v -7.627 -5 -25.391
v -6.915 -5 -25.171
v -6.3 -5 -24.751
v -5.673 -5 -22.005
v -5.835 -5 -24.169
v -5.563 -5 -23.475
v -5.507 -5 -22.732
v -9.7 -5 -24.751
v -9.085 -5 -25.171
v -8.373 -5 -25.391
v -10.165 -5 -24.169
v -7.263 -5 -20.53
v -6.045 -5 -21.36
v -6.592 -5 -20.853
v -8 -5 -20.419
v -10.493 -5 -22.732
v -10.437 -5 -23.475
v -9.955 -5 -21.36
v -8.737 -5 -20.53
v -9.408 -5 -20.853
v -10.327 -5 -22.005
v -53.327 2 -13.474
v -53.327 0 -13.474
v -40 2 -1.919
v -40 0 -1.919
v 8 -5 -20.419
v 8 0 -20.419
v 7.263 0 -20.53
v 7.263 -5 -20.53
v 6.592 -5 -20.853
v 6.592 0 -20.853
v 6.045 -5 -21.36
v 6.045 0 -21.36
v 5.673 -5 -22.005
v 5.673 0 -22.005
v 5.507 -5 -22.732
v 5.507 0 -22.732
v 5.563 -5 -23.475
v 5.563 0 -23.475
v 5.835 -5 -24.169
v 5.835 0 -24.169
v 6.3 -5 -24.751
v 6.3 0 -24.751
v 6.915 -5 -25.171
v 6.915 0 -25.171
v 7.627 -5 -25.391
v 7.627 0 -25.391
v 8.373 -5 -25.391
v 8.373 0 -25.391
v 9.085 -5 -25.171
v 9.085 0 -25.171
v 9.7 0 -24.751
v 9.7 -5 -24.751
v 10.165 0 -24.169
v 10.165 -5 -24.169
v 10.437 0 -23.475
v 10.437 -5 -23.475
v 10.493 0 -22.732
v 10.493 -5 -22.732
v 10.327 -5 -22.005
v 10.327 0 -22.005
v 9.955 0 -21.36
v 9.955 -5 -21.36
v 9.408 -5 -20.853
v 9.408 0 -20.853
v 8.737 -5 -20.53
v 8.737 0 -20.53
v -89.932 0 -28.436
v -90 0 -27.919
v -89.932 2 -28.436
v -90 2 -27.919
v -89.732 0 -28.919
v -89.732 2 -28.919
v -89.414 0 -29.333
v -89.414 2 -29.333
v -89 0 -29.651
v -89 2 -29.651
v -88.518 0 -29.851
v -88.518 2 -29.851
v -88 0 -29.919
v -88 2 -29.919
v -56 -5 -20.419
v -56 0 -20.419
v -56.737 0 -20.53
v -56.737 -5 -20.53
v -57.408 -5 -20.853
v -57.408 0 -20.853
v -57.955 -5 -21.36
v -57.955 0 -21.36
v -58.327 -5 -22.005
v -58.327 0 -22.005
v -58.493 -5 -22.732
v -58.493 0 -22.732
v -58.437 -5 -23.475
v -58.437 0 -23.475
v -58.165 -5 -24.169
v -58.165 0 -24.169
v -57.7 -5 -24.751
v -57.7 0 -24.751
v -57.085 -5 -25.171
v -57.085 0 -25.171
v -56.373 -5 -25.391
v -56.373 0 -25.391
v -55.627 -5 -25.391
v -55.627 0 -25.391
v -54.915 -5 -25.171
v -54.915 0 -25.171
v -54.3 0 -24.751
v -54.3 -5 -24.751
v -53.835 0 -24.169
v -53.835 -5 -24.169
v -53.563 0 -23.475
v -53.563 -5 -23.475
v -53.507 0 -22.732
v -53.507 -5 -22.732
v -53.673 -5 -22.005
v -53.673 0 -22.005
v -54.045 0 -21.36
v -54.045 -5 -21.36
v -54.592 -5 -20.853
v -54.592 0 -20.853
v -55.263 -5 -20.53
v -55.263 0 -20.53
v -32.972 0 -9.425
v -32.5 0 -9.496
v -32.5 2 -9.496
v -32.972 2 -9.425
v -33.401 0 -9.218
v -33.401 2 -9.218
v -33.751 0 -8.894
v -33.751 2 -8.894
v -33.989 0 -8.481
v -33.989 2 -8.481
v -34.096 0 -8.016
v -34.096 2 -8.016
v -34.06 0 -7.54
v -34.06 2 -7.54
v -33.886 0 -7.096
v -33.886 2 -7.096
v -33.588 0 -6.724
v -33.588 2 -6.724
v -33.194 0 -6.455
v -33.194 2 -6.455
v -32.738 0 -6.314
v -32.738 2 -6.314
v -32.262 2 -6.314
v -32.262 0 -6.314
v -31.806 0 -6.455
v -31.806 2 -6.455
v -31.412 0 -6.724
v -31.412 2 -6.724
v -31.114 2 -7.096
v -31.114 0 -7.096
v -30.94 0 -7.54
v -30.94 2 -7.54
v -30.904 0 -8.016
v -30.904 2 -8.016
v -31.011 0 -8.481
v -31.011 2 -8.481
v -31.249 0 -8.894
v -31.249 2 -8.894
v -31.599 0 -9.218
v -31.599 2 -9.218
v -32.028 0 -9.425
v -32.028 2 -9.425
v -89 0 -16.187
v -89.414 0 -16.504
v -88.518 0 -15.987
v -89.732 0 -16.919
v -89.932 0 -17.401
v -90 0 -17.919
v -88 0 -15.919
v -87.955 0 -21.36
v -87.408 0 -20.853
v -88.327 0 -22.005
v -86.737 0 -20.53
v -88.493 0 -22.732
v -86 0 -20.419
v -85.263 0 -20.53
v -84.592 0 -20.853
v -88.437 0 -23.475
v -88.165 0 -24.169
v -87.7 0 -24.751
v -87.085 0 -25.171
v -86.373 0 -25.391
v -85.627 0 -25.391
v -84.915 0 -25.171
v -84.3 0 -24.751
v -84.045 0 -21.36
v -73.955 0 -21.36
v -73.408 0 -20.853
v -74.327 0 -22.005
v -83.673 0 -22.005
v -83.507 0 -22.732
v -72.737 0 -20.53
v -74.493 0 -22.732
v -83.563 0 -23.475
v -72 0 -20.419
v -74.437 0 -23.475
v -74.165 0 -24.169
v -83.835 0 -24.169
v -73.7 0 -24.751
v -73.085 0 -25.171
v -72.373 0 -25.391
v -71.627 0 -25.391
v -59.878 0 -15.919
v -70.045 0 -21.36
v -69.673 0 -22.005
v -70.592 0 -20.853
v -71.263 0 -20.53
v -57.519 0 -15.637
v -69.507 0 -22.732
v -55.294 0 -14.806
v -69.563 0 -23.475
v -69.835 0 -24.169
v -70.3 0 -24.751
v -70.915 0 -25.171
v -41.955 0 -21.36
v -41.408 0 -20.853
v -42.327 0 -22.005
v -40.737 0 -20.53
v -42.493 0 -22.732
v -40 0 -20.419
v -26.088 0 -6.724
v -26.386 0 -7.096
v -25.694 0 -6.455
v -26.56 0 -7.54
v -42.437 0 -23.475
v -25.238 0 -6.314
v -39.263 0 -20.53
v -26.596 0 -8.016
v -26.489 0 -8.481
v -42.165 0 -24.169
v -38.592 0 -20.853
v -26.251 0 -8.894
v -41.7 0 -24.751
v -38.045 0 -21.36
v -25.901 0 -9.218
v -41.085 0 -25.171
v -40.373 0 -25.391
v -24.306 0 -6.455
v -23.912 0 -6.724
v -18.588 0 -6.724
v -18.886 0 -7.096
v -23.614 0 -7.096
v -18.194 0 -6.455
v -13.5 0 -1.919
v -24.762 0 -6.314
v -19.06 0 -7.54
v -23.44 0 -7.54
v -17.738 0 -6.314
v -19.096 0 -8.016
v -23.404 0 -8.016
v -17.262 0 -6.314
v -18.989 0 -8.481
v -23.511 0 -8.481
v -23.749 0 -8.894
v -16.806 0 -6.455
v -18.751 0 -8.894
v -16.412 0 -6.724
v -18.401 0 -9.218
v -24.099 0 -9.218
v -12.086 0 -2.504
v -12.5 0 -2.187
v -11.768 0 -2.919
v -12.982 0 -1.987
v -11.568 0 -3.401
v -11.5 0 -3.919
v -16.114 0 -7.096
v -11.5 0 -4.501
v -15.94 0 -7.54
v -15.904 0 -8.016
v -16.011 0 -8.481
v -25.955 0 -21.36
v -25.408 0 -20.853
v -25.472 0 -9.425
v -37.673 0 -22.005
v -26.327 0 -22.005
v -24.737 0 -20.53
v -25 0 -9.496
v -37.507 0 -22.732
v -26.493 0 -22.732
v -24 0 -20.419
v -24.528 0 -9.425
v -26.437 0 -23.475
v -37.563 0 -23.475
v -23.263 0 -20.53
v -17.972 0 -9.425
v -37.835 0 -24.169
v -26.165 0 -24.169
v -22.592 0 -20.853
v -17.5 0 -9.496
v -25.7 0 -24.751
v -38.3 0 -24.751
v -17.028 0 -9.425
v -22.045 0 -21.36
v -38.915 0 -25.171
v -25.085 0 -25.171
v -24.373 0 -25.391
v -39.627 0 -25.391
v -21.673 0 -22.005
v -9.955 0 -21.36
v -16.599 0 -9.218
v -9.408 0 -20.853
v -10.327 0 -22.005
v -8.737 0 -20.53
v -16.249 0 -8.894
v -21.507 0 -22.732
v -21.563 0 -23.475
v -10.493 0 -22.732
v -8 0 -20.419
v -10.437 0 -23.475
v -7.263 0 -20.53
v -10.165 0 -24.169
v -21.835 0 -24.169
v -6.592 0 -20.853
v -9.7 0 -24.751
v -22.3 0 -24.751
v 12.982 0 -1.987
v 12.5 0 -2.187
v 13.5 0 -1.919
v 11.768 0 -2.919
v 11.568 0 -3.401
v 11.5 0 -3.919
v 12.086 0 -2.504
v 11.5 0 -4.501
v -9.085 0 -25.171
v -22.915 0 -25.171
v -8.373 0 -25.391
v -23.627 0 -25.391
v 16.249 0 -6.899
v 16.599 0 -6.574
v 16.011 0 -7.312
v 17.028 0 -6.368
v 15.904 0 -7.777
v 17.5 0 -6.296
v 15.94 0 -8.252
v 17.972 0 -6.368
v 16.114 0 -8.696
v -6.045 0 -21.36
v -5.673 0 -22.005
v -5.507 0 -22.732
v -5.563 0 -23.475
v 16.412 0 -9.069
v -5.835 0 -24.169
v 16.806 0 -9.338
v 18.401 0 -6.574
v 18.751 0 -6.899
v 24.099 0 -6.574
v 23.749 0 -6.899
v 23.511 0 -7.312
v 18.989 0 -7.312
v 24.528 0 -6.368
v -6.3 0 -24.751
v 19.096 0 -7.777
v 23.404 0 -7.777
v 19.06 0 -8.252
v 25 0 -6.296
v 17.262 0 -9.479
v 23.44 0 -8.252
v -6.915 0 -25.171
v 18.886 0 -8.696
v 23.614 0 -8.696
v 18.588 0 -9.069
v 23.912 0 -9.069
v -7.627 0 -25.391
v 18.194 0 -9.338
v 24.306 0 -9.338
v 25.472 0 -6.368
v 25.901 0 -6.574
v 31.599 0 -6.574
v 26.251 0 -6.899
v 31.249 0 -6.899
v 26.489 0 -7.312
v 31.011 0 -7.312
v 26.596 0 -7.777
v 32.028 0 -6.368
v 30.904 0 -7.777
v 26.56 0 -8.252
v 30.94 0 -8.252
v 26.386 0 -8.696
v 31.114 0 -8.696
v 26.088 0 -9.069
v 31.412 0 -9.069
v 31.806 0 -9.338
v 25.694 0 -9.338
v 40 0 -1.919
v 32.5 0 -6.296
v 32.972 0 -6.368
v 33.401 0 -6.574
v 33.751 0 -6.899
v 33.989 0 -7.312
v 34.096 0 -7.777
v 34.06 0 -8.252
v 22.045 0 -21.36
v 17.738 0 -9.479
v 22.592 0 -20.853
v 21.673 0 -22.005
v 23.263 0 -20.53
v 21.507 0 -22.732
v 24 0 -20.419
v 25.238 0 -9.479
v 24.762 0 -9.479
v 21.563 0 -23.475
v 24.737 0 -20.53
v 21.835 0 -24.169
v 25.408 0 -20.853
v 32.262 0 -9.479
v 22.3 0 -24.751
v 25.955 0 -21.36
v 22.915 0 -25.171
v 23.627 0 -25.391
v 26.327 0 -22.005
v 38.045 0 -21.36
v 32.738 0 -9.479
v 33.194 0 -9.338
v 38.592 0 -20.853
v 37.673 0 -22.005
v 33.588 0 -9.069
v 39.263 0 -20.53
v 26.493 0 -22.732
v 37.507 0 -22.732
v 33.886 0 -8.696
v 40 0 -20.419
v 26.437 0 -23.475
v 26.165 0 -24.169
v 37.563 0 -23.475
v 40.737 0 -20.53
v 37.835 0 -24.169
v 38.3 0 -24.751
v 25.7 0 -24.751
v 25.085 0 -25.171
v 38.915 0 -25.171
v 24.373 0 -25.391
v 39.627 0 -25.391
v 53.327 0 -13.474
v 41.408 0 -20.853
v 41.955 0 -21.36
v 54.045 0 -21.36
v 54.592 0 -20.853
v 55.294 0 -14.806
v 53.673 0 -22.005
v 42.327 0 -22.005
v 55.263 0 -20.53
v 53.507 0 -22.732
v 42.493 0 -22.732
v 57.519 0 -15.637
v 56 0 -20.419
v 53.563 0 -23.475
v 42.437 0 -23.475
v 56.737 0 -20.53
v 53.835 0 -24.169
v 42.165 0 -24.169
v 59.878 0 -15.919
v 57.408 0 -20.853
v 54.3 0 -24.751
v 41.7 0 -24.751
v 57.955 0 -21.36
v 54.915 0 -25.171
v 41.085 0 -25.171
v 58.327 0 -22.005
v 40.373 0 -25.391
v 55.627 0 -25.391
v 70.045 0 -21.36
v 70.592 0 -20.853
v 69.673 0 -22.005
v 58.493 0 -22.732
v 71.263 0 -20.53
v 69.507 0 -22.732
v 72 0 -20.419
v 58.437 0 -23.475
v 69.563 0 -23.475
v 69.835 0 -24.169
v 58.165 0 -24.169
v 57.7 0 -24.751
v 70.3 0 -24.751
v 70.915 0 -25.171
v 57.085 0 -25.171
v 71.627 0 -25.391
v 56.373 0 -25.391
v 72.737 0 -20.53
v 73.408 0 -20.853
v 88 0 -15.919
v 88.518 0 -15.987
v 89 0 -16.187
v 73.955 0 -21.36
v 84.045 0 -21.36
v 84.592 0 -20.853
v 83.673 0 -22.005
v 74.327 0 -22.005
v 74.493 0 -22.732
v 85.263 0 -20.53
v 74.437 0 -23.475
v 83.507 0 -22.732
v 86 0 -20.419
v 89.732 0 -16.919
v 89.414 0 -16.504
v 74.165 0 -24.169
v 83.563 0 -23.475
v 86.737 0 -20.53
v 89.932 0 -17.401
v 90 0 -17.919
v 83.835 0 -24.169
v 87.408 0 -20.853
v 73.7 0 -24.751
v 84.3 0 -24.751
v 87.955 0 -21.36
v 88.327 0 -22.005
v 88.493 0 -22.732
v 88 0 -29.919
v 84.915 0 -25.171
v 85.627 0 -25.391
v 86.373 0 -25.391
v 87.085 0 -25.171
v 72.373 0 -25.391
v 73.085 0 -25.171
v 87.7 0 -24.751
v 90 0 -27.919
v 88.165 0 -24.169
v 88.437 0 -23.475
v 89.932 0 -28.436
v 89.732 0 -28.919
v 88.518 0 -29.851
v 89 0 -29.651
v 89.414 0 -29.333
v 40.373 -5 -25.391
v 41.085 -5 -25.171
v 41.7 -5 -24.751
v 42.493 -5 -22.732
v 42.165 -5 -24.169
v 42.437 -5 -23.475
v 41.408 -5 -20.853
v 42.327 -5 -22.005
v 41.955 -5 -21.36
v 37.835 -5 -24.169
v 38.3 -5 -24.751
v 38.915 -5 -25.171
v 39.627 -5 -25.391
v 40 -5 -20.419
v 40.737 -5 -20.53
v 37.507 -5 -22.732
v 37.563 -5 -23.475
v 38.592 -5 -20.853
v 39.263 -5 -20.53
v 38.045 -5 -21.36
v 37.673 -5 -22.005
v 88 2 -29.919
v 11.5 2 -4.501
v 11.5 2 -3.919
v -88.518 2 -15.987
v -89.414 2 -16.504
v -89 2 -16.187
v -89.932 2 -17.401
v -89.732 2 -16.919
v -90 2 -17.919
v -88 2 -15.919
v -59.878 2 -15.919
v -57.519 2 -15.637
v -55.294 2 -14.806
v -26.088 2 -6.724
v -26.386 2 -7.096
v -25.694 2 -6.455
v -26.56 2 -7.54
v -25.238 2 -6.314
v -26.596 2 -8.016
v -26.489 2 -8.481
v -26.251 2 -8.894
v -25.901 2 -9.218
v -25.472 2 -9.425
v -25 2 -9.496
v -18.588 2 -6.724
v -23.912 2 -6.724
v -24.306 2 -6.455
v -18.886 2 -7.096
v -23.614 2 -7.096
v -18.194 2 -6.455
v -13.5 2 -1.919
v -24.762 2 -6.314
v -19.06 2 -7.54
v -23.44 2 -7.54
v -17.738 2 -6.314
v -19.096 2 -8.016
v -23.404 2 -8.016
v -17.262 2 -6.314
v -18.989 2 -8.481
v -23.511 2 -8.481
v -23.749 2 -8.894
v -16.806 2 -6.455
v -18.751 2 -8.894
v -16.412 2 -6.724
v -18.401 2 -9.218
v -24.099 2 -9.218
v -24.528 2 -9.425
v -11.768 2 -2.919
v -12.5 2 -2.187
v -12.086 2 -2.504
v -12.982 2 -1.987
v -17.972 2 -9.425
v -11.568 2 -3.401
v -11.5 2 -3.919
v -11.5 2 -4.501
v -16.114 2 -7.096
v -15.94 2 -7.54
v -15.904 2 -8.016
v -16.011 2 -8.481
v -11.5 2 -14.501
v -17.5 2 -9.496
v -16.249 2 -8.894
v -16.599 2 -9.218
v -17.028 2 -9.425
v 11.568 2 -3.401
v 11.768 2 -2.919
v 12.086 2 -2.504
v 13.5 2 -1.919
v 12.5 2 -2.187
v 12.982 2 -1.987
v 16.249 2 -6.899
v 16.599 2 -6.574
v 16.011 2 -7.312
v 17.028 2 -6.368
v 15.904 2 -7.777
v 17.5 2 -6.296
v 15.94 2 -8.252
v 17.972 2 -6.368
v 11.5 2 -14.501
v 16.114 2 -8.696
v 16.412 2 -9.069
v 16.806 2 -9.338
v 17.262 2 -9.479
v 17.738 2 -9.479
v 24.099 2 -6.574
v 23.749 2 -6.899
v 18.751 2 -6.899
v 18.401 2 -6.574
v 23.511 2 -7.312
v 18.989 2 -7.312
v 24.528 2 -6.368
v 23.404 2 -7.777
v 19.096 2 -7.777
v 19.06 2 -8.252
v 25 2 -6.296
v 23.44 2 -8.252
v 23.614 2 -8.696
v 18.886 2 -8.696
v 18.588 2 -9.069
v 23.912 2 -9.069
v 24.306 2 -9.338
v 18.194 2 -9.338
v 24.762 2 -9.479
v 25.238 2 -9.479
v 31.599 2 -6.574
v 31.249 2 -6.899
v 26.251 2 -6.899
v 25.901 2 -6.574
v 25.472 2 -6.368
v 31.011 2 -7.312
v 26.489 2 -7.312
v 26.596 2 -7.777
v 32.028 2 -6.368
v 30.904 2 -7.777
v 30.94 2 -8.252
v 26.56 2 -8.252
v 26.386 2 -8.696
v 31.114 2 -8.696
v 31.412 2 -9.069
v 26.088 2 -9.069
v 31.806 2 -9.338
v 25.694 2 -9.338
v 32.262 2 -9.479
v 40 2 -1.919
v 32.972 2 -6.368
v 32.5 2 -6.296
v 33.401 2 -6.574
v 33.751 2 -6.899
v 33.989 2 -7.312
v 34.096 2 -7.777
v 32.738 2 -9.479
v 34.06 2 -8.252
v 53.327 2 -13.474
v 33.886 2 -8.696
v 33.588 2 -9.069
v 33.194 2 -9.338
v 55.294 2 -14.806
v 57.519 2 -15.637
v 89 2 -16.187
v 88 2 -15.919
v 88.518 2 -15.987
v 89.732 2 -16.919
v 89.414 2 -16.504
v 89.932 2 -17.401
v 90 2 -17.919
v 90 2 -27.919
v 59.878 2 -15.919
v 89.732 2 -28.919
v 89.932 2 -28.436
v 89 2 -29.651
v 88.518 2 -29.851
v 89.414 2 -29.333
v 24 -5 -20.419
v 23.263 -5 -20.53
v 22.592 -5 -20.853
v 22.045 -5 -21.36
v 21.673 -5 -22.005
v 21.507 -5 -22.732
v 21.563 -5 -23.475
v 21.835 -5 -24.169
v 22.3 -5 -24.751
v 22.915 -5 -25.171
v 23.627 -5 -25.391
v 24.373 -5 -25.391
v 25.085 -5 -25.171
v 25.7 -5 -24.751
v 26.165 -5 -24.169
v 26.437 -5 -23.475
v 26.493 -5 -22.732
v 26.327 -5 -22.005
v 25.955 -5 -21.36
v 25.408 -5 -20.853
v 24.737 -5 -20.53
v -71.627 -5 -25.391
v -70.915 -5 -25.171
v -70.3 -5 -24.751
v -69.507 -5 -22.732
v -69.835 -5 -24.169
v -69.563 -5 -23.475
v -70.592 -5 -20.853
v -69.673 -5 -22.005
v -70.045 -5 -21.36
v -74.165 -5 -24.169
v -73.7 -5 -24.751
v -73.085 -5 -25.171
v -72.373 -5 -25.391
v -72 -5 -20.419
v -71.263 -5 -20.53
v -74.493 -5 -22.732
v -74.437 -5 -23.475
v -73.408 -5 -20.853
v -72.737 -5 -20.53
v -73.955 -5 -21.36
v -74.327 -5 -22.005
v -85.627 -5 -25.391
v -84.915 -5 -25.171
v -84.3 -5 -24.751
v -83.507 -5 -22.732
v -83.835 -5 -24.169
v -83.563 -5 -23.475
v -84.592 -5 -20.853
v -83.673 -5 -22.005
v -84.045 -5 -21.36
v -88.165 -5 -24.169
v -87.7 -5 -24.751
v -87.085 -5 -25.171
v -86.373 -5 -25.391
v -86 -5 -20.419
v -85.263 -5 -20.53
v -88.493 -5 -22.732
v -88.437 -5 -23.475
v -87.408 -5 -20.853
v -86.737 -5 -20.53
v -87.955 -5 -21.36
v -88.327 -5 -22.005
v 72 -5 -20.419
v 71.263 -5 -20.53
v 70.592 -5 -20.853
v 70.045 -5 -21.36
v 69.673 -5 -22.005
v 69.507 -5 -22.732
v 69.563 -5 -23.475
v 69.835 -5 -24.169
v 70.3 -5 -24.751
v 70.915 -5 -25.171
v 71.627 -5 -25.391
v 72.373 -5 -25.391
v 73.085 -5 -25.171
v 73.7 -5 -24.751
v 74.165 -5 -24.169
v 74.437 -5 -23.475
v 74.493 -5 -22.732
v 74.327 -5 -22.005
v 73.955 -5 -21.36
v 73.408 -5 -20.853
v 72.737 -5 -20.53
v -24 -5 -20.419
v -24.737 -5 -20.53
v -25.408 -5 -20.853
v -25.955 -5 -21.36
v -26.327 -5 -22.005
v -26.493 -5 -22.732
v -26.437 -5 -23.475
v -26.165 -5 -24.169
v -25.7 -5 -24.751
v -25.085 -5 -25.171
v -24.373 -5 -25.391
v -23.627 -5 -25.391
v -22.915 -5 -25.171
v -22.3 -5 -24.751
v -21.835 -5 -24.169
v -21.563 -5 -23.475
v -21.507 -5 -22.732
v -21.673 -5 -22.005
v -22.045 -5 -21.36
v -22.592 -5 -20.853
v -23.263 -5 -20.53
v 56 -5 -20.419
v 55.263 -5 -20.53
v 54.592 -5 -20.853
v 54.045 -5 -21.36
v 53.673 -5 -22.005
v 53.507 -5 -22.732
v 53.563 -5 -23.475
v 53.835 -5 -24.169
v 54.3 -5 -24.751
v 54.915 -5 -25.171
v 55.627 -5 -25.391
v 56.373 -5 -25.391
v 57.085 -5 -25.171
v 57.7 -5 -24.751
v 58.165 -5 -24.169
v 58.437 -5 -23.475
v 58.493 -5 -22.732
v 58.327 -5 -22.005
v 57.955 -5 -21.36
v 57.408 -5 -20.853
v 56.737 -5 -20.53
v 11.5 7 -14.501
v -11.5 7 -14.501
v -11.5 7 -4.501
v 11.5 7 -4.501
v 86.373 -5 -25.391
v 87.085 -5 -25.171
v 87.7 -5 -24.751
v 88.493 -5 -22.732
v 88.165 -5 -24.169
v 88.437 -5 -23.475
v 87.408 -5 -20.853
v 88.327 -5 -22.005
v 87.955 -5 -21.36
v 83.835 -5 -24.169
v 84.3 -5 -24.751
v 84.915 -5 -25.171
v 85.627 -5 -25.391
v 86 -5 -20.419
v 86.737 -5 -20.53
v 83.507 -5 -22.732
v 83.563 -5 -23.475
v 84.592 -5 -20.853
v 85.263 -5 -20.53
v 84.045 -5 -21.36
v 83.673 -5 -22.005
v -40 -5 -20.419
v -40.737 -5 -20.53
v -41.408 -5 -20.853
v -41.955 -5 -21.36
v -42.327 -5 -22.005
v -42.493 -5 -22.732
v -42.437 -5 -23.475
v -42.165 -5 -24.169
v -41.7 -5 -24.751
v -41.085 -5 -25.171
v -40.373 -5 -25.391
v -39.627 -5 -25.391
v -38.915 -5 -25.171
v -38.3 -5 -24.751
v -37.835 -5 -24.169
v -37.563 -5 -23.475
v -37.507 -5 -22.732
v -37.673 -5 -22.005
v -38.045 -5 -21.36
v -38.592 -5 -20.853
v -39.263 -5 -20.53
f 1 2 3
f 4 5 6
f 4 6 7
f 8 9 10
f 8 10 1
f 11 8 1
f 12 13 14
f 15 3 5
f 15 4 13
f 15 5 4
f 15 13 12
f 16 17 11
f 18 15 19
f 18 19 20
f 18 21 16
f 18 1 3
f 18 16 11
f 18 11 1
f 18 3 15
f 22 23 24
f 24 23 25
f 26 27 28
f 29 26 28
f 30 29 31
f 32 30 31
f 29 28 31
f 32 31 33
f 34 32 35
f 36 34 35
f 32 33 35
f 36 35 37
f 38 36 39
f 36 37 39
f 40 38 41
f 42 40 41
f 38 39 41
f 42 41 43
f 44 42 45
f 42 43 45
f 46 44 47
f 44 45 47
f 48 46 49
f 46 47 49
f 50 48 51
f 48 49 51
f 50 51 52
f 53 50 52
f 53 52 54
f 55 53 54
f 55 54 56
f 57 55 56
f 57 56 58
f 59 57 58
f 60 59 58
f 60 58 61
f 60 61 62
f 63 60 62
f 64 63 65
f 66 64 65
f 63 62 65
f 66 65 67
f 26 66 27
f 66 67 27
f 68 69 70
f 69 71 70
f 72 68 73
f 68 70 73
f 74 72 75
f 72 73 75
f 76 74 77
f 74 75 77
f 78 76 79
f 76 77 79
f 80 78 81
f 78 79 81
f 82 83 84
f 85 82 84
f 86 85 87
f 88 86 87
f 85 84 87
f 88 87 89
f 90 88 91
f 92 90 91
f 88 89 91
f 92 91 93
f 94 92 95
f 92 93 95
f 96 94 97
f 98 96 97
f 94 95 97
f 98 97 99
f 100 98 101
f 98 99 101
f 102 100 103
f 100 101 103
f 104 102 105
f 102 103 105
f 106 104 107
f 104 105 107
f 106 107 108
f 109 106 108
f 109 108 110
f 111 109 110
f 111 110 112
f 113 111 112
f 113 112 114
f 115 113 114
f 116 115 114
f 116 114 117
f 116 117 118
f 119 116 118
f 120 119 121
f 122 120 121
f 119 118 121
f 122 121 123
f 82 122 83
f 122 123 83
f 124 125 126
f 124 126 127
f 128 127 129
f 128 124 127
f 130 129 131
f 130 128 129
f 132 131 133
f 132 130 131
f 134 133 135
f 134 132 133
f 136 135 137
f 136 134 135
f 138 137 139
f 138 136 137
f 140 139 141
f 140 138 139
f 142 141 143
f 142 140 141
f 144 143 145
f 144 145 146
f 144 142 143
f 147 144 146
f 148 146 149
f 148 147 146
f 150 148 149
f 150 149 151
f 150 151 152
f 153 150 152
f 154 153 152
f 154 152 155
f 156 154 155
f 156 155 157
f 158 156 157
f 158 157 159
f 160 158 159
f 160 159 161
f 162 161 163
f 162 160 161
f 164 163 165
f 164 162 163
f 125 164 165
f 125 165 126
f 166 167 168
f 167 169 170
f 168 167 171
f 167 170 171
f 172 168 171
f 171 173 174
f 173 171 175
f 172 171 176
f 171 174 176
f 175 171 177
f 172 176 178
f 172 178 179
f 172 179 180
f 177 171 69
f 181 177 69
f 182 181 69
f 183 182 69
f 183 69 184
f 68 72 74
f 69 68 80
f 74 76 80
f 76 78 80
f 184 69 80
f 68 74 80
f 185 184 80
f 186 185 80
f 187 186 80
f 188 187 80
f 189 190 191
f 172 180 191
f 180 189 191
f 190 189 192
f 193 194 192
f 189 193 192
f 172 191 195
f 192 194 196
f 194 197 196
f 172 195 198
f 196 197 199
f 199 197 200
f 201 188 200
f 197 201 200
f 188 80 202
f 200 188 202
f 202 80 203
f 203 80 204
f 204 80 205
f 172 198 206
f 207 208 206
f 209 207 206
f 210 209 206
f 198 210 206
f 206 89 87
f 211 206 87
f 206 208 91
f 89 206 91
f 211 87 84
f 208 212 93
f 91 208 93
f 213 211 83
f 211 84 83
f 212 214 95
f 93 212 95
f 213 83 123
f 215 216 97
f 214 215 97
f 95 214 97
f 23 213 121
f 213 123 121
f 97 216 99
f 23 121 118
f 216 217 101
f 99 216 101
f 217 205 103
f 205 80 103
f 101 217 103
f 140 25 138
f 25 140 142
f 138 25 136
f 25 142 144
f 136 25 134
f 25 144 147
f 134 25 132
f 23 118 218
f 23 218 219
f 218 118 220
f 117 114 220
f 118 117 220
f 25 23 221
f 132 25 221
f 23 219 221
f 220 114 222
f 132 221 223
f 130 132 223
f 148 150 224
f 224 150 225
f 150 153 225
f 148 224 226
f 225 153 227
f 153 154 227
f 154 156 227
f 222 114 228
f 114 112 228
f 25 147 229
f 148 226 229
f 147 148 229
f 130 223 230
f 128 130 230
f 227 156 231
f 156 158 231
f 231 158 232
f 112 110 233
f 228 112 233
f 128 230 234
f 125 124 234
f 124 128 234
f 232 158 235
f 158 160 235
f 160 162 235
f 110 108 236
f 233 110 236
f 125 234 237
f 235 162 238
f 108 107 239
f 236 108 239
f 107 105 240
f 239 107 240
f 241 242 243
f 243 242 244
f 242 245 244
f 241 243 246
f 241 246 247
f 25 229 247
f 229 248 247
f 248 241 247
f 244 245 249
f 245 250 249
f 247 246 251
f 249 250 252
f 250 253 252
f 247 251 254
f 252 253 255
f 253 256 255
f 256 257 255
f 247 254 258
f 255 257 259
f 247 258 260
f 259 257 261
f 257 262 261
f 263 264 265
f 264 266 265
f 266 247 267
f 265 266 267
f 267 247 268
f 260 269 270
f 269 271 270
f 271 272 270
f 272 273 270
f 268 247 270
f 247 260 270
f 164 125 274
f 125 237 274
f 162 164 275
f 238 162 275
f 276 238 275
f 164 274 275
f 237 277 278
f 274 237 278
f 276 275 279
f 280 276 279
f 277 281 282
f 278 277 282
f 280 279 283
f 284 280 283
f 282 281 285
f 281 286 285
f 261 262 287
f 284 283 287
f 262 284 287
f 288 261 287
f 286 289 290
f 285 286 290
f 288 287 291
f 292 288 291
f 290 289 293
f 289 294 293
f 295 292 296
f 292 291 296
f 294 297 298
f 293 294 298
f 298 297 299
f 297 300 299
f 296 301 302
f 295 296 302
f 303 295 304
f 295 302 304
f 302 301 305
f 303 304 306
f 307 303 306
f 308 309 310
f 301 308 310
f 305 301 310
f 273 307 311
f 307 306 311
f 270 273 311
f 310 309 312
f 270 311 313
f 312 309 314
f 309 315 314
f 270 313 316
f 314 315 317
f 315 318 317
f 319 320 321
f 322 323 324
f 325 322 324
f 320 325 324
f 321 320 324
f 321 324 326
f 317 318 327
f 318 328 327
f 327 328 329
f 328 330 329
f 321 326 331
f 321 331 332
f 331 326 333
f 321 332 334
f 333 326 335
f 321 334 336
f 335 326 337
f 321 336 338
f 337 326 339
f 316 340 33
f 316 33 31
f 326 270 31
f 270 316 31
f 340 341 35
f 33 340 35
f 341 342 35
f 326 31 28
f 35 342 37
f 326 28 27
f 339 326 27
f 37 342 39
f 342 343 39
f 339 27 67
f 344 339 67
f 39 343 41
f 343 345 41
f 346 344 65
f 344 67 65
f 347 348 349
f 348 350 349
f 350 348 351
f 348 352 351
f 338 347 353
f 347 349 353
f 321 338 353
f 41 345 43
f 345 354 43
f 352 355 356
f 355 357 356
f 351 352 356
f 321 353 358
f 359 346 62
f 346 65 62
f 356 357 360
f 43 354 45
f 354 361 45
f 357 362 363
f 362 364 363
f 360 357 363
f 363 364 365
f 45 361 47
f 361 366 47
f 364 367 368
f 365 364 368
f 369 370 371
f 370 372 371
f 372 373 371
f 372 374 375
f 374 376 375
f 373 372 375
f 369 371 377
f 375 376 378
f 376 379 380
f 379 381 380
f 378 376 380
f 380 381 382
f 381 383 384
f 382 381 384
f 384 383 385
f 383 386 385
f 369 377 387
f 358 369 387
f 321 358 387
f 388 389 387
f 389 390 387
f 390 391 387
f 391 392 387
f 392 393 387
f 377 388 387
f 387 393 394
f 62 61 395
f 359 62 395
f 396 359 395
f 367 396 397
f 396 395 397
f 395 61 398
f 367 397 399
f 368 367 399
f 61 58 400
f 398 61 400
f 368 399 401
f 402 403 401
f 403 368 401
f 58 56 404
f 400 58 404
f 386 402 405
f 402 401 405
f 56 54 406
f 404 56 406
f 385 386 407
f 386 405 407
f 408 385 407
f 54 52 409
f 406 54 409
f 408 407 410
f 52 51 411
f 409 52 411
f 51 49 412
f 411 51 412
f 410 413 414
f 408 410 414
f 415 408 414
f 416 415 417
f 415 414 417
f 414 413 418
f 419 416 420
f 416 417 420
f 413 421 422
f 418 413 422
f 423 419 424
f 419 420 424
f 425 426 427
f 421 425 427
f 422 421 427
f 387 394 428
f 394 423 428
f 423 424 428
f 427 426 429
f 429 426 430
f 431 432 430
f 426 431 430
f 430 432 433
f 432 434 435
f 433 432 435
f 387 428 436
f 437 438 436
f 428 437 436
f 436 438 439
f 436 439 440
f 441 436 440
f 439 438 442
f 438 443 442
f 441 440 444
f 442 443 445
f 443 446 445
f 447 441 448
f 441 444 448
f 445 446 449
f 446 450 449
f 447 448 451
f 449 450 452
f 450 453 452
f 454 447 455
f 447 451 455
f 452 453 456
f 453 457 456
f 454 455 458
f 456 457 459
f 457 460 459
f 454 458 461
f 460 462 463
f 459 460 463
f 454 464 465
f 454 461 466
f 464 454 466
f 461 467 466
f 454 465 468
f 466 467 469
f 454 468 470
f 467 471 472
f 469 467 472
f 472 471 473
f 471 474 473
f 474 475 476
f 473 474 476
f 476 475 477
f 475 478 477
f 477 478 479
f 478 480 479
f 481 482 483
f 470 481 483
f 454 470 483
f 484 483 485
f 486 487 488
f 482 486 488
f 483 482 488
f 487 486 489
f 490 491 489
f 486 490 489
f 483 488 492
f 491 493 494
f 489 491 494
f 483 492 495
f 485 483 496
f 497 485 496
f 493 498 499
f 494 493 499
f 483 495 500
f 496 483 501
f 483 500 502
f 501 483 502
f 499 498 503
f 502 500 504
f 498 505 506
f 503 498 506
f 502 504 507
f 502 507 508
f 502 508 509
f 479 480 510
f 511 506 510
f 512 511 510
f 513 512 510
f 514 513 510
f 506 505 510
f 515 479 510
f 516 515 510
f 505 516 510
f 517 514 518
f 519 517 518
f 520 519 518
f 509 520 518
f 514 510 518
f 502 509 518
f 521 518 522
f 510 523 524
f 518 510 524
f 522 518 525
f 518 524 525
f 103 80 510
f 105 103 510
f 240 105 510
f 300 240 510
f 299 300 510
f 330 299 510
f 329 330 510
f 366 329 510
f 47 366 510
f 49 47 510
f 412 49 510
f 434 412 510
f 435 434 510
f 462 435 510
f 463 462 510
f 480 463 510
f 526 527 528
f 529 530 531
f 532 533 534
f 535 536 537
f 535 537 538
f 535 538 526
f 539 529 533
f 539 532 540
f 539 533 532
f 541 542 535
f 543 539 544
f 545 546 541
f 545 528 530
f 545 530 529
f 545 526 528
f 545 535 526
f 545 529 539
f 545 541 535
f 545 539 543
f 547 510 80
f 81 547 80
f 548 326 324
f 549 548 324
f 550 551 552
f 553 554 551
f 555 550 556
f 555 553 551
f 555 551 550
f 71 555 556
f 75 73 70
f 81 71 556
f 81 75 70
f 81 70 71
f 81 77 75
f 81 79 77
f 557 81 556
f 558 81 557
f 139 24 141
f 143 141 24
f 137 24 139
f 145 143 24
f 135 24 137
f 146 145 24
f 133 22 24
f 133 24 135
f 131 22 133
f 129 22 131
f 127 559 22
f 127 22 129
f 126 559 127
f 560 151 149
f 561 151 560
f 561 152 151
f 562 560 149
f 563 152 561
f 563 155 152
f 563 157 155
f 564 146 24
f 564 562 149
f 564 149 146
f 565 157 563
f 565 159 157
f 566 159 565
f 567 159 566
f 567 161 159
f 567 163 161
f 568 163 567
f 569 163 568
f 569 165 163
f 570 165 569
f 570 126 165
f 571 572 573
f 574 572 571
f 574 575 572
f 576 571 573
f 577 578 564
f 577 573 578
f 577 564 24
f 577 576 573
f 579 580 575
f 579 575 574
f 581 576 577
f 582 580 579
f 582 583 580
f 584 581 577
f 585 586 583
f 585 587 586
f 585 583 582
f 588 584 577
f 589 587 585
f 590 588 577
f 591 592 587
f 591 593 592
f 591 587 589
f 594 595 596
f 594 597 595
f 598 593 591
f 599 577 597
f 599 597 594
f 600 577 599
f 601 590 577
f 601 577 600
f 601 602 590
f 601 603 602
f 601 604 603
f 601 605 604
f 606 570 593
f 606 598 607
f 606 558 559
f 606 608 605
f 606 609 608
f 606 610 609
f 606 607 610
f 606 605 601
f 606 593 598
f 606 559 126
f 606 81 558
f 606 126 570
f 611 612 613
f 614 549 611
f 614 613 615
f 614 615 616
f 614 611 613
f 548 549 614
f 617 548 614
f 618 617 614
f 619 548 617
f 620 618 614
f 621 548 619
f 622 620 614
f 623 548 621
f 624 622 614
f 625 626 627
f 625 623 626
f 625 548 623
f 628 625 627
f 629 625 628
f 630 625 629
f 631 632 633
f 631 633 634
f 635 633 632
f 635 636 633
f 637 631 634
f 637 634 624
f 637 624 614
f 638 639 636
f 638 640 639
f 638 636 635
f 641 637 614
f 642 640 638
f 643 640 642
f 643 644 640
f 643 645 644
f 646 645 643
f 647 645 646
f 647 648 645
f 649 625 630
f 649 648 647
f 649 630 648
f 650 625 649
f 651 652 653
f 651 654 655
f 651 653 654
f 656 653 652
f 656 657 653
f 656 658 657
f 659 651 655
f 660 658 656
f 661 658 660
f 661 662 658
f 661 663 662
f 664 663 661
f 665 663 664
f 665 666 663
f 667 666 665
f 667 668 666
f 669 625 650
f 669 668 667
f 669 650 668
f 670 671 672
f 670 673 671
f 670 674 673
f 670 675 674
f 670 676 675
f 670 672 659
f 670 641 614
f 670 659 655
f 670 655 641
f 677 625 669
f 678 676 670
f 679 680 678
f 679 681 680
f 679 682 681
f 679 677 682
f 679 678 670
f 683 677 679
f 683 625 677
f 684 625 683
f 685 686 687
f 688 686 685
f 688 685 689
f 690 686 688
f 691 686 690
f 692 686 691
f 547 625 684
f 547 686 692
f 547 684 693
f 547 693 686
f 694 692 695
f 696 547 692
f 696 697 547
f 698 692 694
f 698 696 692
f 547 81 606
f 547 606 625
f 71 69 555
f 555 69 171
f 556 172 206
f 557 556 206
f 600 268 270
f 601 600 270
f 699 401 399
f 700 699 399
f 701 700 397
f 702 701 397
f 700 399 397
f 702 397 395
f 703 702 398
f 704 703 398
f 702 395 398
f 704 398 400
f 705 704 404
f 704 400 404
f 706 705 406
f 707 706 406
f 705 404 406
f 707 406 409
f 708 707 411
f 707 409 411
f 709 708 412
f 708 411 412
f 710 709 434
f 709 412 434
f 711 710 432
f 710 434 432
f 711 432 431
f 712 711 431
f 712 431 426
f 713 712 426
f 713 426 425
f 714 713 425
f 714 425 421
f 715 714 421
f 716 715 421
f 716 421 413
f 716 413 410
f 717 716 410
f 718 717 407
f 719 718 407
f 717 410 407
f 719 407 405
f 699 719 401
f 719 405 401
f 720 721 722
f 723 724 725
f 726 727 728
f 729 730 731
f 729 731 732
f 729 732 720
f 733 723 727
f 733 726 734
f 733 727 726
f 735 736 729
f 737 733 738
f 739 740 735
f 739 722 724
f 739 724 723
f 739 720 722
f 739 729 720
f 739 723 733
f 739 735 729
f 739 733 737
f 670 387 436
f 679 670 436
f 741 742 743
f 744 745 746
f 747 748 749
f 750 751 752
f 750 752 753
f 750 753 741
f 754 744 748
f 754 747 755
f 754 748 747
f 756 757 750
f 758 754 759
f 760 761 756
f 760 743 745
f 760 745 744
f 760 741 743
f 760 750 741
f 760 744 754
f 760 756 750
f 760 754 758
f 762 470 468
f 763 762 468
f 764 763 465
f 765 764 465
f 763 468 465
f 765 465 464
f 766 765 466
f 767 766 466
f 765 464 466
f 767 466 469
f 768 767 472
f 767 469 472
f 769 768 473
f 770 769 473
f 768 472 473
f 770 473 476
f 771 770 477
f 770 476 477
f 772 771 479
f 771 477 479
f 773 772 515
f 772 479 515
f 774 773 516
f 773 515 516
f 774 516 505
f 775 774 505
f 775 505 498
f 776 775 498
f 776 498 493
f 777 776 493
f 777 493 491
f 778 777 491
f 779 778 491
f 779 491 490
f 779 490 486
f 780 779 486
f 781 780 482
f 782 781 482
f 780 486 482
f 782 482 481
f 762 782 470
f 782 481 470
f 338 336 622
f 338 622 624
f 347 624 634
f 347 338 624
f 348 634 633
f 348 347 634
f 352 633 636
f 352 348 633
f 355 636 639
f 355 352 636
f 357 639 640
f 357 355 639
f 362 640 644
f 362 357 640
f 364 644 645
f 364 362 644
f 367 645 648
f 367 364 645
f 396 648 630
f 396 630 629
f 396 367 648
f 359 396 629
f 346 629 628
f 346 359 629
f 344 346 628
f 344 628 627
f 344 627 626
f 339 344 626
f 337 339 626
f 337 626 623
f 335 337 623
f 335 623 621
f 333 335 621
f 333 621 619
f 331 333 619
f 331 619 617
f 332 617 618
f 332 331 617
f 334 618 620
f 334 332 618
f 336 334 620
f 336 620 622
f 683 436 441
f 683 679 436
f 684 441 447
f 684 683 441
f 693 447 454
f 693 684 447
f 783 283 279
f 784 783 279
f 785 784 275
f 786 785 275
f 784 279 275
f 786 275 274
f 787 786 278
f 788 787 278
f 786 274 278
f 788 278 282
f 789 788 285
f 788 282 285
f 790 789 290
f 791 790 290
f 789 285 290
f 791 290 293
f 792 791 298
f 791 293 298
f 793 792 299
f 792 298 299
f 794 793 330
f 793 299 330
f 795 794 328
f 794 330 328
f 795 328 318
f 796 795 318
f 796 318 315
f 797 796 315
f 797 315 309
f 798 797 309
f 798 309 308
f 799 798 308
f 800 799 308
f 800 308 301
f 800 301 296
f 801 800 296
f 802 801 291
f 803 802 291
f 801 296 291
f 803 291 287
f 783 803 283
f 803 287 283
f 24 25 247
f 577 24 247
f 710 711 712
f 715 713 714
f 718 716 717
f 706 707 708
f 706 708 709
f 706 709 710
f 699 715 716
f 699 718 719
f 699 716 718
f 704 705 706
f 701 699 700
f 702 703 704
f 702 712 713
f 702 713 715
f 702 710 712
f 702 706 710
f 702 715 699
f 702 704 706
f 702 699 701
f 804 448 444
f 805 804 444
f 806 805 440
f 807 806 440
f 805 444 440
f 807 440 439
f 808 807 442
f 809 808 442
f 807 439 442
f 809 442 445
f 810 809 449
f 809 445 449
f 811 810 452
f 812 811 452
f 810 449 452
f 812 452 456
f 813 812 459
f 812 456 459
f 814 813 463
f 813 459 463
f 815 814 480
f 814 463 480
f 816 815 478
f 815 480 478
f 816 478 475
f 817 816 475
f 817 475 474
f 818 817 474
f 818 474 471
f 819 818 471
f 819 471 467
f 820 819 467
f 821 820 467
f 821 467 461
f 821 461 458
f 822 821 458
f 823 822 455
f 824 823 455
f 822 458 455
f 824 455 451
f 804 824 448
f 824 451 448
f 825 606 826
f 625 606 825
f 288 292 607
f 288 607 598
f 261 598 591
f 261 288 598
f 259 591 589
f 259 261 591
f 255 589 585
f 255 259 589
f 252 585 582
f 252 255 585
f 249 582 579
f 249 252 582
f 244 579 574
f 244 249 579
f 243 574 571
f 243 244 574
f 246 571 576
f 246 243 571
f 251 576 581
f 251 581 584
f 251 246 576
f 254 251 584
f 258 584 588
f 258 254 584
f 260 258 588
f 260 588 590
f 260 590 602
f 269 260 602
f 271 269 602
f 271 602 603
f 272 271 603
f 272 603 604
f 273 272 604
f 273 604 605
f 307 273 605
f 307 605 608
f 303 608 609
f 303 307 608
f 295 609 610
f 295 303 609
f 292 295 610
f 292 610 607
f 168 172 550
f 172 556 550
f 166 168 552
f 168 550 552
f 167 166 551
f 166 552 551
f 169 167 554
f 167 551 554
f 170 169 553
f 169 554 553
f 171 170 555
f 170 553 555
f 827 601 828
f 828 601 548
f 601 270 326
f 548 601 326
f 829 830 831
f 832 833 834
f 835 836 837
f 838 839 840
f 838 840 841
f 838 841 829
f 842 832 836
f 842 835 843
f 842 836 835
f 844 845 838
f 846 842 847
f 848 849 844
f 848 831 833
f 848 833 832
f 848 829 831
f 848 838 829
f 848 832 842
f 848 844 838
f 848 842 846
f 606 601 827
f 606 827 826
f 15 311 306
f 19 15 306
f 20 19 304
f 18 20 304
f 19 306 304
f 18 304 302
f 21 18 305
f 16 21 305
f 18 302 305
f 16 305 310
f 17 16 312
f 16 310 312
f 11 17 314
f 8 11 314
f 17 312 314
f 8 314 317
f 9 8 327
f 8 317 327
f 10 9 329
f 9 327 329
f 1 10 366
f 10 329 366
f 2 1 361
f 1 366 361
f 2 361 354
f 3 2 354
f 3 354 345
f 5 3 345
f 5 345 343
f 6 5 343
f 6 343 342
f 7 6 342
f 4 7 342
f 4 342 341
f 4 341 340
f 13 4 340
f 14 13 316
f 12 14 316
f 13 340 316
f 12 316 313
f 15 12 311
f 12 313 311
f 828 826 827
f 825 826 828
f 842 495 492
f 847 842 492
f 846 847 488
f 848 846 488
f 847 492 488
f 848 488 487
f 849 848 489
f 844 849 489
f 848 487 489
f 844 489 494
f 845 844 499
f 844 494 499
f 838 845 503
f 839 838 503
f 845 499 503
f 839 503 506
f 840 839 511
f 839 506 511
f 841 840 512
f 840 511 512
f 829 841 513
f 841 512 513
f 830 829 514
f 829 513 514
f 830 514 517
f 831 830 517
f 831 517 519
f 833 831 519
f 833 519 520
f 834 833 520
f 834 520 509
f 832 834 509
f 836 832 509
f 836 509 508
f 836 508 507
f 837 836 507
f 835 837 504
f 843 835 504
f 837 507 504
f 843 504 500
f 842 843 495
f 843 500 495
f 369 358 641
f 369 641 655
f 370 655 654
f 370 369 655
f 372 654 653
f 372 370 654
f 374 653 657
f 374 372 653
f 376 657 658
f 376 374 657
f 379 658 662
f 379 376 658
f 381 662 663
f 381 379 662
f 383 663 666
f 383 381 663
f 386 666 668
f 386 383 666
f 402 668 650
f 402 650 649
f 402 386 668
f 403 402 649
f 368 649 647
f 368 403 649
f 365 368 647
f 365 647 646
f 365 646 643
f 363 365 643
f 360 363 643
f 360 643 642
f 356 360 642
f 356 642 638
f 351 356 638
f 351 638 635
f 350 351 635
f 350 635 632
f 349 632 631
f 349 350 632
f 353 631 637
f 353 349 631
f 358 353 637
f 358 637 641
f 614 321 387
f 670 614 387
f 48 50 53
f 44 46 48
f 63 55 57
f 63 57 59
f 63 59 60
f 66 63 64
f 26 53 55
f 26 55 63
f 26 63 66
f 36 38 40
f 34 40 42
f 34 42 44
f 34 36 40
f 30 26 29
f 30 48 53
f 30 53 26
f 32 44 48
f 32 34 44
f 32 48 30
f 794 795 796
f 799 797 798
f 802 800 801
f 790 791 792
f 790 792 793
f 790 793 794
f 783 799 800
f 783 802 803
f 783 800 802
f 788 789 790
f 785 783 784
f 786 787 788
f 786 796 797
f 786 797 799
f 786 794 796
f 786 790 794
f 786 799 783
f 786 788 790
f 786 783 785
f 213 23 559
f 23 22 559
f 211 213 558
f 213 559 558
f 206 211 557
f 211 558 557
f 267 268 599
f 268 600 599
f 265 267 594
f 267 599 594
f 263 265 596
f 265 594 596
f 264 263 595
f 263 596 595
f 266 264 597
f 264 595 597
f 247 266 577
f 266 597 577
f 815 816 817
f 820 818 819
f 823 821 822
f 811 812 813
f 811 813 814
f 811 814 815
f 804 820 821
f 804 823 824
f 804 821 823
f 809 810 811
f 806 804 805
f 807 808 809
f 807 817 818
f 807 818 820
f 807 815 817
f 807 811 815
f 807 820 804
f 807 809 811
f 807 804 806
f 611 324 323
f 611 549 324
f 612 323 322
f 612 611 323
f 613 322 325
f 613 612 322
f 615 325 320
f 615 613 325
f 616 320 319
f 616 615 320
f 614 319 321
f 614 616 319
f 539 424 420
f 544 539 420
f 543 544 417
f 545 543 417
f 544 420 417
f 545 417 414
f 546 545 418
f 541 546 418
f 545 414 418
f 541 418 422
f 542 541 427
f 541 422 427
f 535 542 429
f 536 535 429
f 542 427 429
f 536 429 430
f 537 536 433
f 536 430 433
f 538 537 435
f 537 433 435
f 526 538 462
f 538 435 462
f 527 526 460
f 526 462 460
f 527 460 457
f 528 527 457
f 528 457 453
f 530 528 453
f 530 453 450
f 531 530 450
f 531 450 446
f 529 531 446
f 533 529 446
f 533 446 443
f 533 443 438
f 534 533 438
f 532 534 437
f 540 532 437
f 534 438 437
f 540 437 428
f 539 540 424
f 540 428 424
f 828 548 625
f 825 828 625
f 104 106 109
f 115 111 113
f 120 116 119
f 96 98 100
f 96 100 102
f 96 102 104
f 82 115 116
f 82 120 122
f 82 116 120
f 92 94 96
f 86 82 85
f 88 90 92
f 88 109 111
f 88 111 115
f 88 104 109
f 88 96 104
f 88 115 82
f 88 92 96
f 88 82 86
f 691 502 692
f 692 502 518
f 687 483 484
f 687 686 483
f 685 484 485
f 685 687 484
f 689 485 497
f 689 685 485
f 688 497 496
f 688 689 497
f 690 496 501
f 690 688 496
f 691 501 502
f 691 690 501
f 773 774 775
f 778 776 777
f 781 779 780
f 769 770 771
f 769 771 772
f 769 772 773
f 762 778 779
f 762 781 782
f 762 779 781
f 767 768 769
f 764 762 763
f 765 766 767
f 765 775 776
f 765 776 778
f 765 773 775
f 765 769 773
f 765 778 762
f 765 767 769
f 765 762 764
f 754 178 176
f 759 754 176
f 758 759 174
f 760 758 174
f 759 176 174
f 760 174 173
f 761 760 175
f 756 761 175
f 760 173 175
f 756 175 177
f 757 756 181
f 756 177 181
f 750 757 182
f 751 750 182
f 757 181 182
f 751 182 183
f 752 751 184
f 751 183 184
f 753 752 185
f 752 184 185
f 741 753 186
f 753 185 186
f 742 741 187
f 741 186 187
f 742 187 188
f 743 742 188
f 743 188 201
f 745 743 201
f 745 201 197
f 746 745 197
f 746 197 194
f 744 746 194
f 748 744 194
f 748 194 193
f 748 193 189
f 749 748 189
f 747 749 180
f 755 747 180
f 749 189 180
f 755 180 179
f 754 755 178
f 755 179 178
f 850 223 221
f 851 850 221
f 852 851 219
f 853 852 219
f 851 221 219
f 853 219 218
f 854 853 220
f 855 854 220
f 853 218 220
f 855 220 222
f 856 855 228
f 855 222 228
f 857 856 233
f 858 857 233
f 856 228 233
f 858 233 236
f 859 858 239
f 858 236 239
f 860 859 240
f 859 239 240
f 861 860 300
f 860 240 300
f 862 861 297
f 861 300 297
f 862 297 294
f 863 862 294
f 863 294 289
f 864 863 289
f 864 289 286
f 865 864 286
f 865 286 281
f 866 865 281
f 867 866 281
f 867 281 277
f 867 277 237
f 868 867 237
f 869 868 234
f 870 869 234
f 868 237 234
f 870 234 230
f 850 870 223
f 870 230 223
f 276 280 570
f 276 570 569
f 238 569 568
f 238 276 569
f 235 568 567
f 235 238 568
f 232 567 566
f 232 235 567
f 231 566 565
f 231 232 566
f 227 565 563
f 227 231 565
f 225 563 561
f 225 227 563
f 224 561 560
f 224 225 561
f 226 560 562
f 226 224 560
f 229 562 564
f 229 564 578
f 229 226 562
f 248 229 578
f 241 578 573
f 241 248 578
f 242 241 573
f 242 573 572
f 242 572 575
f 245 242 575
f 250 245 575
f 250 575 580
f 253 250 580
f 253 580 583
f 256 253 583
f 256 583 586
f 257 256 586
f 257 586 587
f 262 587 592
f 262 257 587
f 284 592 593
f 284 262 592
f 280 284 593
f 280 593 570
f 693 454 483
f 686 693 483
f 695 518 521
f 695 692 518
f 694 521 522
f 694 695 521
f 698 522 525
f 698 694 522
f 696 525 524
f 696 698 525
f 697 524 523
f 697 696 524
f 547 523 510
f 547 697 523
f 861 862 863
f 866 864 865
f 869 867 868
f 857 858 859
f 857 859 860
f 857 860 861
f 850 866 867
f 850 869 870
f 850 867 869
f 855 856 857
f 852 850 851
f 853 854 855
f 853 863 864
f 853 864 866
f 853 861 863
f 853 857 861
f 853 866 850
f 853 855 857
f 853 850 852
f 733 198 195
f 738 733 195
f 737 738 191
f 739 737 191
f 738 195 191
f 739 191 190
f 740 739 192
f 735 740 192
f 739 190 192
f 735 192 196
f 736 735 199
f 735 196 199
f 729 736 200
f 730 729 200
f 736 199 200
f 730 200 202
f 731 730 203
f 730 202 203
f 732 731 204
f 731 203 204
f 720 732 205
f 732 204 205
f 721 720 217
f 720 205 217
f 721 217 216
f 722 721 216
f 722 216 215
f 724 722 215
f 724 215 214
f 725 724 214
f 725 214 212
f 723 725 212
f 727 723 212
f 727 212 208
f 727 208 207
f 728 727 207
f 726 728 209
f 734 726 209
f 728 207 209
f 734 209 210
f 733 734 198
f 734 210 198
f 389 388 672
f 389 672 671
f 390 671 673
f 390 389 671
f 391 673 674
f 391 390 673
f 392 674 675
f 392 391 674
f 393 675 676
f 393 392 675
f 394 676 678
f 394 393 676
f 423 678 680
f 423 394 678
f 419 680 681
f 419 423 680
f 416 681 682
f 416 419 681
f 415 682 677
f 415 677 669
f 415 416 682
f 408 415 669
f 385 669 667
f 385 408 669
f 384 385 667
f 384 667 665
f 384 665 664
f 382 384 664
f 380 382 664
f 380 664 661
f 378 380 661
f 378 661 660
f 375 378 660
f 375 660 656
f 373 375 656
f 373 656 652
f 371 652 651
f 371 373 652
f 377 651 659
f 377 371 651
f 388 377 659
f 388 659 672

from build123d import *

# Parameters (mm, degrees)
SKETCH_1_R      = 1.6
EXTRUDE_1_DEPTH = 2
FILLET_1_R      = 2
FILLET_2_R      = 10
SKETCH_2_R      = 2.5
EXTRUDE_2_DEPTH = 5
SKETCH_3_W      = 23
SKETCH_3_H      = 10
EXTRUDE_4_DEPTH = 5


with BuildPart() as part:
    # 草图1 → 凸台-拉伸1 (new body)
    with BuildSketch(Plane(origin=(0, 0, 0), x_dir=(1, 0, 0), z_dir=(0, 1, 0))):
        Polygon((-11.5, 4.501120792), (11.5, 4.501120792), (11.5, 1.918654762), (40, 1.918654762), (56.146384284, 15.918654762), (90, 15.918654762), (90, 29.918654762), (-90, 29.918654762), (-90, 15.918654762), (-56.146384284, 15.918654762), (-40, 1.918654762), (-11.5, 1.918654762), align=None)
        with Locations(Location((17.5, 7.896444982, 0), (0, 0, 270))):
            Circle(SKETCH_1_R, mode=Mode.SUBTRACT)
        with Locations(Location((25, 7.896444982, 0), (0, 0, 270))):
            Circle(SKETCH_1_R, mode=Mode.SUBTRACT)
        with Locations(Location((32.5, 7.896444982, 0), (0, 0, 270))):
            Circle(SKETCH_1_R, mode=Mode.SUBTRACT)
        with Locations(Location((-32.5, 7.896444982, 0), (0, 0, 90))):
            Circle(SKETCH_1_R, mode=Mode.SUBTRACT)
        with Locations(Location((-25, 7.896444982, 0), (0, 0, 90))):
            Circle(SKETCH_1_R, mode=Mode.SUBTRACT)
        with Locations(Location((-17.5, 7.896444982, 0), (0, 0, 90))):
            Circle(SKETCH_1_R, mode=Mode.SUBTRACT)
    extrude(amount=EXTRUDE_1_DEPTH)

    # 圆角1
    fillet_1_edges = [part.edges().sort_by_distance(p)[0] for p in [
        (-11.5, 1, -1.918654762),
        (-90, 1, -15.918654762),
        (-90, 1, -29.918654762),
        (90, 1, -29.918654762),
        (90, 1, -15.918654762),
        (11.5, 1, -1.918654762),
    ]]
    fillet(fillet_1_edges, radius=FILLET_1_R)

    # 圆角2
    fillet_2_edges = [part.edges().sort_by_distance(p)[0] for p in [
        (-56.146384284, 1, -15.918654762),
        (56.146384284, 1, -15.918654762),
    ]]
    fillet(fillet_2_edges, radius=FILLET_2_R)

    # 草图2 → 凸台-拉伸2 (add)
    with BuildSketch(Plane.XZ):
        with Locations(Location((-8, -22.918654762, 0), (0, 0, 90))):
            Circle(SKETCH_2_R)
        with Locations(Location((-24, -22.918654762, 0), (0, 0, 90))):
            Circle(SKETCH_2_R)
        with Locations(Location((-40, -22.918654762, 0), (0, 0, 90))):
            Circle(SKETCH_2_R)
        with Locations(Location((-56, -22.918654762, 0), (0, 0, 90))):
            Circle(SKETCH_2_R)
        with Locations(Location((-72, -22.918654762, 0), (0, 0, 90))):
            Circle(SKETCH_2_R)
        with Locations(Location((-86, -22.918654762, 0), (0, 0, 90))):
            Circle(SKETCH_2_R)
        with Locations(Location((8, -22.918654762, 0), (0, 0, 90))):
            Circle(SKETCH_2_R)
        with Locations(Location((24, -22.918654762, 0), (0, 0, 90))):
            Circle(SKETCH_2_R)
        with Locations(Location((40, -22.918654762, 0), (0, 0, 90))):
            Circle(SKETCH_2_R)
        with Locations(Location((56, -22.918654762, 0), (0, 0, 90))):
            Circle(SKETCH_2_R)
        with Locations(Location((72, -22.918654762, 0), (0, 0, 90))):
            Circle(SKETCH_2_R)
        with Locations(Location((86, -22.918654762, 0), (0, 0, 90))):
            Circle(SKETCH_2_R)
    extrude(amount=EXTRUDE_2_DEPTH)

    # 草图3 → 凸台-拉伸4 (add)
    with BuildSketch(Plane(origin=(0, 2, 0), x_dir=(1, 0, 0), z_dir=(0, 1, 0))):
        with Locations((0, 9.501120792)):
            Rectangle(SKETCH_3_W, SKETCH_3_H)
    extrude(amount=EXTRUDE_4_DEPTH)


solid = part.part
